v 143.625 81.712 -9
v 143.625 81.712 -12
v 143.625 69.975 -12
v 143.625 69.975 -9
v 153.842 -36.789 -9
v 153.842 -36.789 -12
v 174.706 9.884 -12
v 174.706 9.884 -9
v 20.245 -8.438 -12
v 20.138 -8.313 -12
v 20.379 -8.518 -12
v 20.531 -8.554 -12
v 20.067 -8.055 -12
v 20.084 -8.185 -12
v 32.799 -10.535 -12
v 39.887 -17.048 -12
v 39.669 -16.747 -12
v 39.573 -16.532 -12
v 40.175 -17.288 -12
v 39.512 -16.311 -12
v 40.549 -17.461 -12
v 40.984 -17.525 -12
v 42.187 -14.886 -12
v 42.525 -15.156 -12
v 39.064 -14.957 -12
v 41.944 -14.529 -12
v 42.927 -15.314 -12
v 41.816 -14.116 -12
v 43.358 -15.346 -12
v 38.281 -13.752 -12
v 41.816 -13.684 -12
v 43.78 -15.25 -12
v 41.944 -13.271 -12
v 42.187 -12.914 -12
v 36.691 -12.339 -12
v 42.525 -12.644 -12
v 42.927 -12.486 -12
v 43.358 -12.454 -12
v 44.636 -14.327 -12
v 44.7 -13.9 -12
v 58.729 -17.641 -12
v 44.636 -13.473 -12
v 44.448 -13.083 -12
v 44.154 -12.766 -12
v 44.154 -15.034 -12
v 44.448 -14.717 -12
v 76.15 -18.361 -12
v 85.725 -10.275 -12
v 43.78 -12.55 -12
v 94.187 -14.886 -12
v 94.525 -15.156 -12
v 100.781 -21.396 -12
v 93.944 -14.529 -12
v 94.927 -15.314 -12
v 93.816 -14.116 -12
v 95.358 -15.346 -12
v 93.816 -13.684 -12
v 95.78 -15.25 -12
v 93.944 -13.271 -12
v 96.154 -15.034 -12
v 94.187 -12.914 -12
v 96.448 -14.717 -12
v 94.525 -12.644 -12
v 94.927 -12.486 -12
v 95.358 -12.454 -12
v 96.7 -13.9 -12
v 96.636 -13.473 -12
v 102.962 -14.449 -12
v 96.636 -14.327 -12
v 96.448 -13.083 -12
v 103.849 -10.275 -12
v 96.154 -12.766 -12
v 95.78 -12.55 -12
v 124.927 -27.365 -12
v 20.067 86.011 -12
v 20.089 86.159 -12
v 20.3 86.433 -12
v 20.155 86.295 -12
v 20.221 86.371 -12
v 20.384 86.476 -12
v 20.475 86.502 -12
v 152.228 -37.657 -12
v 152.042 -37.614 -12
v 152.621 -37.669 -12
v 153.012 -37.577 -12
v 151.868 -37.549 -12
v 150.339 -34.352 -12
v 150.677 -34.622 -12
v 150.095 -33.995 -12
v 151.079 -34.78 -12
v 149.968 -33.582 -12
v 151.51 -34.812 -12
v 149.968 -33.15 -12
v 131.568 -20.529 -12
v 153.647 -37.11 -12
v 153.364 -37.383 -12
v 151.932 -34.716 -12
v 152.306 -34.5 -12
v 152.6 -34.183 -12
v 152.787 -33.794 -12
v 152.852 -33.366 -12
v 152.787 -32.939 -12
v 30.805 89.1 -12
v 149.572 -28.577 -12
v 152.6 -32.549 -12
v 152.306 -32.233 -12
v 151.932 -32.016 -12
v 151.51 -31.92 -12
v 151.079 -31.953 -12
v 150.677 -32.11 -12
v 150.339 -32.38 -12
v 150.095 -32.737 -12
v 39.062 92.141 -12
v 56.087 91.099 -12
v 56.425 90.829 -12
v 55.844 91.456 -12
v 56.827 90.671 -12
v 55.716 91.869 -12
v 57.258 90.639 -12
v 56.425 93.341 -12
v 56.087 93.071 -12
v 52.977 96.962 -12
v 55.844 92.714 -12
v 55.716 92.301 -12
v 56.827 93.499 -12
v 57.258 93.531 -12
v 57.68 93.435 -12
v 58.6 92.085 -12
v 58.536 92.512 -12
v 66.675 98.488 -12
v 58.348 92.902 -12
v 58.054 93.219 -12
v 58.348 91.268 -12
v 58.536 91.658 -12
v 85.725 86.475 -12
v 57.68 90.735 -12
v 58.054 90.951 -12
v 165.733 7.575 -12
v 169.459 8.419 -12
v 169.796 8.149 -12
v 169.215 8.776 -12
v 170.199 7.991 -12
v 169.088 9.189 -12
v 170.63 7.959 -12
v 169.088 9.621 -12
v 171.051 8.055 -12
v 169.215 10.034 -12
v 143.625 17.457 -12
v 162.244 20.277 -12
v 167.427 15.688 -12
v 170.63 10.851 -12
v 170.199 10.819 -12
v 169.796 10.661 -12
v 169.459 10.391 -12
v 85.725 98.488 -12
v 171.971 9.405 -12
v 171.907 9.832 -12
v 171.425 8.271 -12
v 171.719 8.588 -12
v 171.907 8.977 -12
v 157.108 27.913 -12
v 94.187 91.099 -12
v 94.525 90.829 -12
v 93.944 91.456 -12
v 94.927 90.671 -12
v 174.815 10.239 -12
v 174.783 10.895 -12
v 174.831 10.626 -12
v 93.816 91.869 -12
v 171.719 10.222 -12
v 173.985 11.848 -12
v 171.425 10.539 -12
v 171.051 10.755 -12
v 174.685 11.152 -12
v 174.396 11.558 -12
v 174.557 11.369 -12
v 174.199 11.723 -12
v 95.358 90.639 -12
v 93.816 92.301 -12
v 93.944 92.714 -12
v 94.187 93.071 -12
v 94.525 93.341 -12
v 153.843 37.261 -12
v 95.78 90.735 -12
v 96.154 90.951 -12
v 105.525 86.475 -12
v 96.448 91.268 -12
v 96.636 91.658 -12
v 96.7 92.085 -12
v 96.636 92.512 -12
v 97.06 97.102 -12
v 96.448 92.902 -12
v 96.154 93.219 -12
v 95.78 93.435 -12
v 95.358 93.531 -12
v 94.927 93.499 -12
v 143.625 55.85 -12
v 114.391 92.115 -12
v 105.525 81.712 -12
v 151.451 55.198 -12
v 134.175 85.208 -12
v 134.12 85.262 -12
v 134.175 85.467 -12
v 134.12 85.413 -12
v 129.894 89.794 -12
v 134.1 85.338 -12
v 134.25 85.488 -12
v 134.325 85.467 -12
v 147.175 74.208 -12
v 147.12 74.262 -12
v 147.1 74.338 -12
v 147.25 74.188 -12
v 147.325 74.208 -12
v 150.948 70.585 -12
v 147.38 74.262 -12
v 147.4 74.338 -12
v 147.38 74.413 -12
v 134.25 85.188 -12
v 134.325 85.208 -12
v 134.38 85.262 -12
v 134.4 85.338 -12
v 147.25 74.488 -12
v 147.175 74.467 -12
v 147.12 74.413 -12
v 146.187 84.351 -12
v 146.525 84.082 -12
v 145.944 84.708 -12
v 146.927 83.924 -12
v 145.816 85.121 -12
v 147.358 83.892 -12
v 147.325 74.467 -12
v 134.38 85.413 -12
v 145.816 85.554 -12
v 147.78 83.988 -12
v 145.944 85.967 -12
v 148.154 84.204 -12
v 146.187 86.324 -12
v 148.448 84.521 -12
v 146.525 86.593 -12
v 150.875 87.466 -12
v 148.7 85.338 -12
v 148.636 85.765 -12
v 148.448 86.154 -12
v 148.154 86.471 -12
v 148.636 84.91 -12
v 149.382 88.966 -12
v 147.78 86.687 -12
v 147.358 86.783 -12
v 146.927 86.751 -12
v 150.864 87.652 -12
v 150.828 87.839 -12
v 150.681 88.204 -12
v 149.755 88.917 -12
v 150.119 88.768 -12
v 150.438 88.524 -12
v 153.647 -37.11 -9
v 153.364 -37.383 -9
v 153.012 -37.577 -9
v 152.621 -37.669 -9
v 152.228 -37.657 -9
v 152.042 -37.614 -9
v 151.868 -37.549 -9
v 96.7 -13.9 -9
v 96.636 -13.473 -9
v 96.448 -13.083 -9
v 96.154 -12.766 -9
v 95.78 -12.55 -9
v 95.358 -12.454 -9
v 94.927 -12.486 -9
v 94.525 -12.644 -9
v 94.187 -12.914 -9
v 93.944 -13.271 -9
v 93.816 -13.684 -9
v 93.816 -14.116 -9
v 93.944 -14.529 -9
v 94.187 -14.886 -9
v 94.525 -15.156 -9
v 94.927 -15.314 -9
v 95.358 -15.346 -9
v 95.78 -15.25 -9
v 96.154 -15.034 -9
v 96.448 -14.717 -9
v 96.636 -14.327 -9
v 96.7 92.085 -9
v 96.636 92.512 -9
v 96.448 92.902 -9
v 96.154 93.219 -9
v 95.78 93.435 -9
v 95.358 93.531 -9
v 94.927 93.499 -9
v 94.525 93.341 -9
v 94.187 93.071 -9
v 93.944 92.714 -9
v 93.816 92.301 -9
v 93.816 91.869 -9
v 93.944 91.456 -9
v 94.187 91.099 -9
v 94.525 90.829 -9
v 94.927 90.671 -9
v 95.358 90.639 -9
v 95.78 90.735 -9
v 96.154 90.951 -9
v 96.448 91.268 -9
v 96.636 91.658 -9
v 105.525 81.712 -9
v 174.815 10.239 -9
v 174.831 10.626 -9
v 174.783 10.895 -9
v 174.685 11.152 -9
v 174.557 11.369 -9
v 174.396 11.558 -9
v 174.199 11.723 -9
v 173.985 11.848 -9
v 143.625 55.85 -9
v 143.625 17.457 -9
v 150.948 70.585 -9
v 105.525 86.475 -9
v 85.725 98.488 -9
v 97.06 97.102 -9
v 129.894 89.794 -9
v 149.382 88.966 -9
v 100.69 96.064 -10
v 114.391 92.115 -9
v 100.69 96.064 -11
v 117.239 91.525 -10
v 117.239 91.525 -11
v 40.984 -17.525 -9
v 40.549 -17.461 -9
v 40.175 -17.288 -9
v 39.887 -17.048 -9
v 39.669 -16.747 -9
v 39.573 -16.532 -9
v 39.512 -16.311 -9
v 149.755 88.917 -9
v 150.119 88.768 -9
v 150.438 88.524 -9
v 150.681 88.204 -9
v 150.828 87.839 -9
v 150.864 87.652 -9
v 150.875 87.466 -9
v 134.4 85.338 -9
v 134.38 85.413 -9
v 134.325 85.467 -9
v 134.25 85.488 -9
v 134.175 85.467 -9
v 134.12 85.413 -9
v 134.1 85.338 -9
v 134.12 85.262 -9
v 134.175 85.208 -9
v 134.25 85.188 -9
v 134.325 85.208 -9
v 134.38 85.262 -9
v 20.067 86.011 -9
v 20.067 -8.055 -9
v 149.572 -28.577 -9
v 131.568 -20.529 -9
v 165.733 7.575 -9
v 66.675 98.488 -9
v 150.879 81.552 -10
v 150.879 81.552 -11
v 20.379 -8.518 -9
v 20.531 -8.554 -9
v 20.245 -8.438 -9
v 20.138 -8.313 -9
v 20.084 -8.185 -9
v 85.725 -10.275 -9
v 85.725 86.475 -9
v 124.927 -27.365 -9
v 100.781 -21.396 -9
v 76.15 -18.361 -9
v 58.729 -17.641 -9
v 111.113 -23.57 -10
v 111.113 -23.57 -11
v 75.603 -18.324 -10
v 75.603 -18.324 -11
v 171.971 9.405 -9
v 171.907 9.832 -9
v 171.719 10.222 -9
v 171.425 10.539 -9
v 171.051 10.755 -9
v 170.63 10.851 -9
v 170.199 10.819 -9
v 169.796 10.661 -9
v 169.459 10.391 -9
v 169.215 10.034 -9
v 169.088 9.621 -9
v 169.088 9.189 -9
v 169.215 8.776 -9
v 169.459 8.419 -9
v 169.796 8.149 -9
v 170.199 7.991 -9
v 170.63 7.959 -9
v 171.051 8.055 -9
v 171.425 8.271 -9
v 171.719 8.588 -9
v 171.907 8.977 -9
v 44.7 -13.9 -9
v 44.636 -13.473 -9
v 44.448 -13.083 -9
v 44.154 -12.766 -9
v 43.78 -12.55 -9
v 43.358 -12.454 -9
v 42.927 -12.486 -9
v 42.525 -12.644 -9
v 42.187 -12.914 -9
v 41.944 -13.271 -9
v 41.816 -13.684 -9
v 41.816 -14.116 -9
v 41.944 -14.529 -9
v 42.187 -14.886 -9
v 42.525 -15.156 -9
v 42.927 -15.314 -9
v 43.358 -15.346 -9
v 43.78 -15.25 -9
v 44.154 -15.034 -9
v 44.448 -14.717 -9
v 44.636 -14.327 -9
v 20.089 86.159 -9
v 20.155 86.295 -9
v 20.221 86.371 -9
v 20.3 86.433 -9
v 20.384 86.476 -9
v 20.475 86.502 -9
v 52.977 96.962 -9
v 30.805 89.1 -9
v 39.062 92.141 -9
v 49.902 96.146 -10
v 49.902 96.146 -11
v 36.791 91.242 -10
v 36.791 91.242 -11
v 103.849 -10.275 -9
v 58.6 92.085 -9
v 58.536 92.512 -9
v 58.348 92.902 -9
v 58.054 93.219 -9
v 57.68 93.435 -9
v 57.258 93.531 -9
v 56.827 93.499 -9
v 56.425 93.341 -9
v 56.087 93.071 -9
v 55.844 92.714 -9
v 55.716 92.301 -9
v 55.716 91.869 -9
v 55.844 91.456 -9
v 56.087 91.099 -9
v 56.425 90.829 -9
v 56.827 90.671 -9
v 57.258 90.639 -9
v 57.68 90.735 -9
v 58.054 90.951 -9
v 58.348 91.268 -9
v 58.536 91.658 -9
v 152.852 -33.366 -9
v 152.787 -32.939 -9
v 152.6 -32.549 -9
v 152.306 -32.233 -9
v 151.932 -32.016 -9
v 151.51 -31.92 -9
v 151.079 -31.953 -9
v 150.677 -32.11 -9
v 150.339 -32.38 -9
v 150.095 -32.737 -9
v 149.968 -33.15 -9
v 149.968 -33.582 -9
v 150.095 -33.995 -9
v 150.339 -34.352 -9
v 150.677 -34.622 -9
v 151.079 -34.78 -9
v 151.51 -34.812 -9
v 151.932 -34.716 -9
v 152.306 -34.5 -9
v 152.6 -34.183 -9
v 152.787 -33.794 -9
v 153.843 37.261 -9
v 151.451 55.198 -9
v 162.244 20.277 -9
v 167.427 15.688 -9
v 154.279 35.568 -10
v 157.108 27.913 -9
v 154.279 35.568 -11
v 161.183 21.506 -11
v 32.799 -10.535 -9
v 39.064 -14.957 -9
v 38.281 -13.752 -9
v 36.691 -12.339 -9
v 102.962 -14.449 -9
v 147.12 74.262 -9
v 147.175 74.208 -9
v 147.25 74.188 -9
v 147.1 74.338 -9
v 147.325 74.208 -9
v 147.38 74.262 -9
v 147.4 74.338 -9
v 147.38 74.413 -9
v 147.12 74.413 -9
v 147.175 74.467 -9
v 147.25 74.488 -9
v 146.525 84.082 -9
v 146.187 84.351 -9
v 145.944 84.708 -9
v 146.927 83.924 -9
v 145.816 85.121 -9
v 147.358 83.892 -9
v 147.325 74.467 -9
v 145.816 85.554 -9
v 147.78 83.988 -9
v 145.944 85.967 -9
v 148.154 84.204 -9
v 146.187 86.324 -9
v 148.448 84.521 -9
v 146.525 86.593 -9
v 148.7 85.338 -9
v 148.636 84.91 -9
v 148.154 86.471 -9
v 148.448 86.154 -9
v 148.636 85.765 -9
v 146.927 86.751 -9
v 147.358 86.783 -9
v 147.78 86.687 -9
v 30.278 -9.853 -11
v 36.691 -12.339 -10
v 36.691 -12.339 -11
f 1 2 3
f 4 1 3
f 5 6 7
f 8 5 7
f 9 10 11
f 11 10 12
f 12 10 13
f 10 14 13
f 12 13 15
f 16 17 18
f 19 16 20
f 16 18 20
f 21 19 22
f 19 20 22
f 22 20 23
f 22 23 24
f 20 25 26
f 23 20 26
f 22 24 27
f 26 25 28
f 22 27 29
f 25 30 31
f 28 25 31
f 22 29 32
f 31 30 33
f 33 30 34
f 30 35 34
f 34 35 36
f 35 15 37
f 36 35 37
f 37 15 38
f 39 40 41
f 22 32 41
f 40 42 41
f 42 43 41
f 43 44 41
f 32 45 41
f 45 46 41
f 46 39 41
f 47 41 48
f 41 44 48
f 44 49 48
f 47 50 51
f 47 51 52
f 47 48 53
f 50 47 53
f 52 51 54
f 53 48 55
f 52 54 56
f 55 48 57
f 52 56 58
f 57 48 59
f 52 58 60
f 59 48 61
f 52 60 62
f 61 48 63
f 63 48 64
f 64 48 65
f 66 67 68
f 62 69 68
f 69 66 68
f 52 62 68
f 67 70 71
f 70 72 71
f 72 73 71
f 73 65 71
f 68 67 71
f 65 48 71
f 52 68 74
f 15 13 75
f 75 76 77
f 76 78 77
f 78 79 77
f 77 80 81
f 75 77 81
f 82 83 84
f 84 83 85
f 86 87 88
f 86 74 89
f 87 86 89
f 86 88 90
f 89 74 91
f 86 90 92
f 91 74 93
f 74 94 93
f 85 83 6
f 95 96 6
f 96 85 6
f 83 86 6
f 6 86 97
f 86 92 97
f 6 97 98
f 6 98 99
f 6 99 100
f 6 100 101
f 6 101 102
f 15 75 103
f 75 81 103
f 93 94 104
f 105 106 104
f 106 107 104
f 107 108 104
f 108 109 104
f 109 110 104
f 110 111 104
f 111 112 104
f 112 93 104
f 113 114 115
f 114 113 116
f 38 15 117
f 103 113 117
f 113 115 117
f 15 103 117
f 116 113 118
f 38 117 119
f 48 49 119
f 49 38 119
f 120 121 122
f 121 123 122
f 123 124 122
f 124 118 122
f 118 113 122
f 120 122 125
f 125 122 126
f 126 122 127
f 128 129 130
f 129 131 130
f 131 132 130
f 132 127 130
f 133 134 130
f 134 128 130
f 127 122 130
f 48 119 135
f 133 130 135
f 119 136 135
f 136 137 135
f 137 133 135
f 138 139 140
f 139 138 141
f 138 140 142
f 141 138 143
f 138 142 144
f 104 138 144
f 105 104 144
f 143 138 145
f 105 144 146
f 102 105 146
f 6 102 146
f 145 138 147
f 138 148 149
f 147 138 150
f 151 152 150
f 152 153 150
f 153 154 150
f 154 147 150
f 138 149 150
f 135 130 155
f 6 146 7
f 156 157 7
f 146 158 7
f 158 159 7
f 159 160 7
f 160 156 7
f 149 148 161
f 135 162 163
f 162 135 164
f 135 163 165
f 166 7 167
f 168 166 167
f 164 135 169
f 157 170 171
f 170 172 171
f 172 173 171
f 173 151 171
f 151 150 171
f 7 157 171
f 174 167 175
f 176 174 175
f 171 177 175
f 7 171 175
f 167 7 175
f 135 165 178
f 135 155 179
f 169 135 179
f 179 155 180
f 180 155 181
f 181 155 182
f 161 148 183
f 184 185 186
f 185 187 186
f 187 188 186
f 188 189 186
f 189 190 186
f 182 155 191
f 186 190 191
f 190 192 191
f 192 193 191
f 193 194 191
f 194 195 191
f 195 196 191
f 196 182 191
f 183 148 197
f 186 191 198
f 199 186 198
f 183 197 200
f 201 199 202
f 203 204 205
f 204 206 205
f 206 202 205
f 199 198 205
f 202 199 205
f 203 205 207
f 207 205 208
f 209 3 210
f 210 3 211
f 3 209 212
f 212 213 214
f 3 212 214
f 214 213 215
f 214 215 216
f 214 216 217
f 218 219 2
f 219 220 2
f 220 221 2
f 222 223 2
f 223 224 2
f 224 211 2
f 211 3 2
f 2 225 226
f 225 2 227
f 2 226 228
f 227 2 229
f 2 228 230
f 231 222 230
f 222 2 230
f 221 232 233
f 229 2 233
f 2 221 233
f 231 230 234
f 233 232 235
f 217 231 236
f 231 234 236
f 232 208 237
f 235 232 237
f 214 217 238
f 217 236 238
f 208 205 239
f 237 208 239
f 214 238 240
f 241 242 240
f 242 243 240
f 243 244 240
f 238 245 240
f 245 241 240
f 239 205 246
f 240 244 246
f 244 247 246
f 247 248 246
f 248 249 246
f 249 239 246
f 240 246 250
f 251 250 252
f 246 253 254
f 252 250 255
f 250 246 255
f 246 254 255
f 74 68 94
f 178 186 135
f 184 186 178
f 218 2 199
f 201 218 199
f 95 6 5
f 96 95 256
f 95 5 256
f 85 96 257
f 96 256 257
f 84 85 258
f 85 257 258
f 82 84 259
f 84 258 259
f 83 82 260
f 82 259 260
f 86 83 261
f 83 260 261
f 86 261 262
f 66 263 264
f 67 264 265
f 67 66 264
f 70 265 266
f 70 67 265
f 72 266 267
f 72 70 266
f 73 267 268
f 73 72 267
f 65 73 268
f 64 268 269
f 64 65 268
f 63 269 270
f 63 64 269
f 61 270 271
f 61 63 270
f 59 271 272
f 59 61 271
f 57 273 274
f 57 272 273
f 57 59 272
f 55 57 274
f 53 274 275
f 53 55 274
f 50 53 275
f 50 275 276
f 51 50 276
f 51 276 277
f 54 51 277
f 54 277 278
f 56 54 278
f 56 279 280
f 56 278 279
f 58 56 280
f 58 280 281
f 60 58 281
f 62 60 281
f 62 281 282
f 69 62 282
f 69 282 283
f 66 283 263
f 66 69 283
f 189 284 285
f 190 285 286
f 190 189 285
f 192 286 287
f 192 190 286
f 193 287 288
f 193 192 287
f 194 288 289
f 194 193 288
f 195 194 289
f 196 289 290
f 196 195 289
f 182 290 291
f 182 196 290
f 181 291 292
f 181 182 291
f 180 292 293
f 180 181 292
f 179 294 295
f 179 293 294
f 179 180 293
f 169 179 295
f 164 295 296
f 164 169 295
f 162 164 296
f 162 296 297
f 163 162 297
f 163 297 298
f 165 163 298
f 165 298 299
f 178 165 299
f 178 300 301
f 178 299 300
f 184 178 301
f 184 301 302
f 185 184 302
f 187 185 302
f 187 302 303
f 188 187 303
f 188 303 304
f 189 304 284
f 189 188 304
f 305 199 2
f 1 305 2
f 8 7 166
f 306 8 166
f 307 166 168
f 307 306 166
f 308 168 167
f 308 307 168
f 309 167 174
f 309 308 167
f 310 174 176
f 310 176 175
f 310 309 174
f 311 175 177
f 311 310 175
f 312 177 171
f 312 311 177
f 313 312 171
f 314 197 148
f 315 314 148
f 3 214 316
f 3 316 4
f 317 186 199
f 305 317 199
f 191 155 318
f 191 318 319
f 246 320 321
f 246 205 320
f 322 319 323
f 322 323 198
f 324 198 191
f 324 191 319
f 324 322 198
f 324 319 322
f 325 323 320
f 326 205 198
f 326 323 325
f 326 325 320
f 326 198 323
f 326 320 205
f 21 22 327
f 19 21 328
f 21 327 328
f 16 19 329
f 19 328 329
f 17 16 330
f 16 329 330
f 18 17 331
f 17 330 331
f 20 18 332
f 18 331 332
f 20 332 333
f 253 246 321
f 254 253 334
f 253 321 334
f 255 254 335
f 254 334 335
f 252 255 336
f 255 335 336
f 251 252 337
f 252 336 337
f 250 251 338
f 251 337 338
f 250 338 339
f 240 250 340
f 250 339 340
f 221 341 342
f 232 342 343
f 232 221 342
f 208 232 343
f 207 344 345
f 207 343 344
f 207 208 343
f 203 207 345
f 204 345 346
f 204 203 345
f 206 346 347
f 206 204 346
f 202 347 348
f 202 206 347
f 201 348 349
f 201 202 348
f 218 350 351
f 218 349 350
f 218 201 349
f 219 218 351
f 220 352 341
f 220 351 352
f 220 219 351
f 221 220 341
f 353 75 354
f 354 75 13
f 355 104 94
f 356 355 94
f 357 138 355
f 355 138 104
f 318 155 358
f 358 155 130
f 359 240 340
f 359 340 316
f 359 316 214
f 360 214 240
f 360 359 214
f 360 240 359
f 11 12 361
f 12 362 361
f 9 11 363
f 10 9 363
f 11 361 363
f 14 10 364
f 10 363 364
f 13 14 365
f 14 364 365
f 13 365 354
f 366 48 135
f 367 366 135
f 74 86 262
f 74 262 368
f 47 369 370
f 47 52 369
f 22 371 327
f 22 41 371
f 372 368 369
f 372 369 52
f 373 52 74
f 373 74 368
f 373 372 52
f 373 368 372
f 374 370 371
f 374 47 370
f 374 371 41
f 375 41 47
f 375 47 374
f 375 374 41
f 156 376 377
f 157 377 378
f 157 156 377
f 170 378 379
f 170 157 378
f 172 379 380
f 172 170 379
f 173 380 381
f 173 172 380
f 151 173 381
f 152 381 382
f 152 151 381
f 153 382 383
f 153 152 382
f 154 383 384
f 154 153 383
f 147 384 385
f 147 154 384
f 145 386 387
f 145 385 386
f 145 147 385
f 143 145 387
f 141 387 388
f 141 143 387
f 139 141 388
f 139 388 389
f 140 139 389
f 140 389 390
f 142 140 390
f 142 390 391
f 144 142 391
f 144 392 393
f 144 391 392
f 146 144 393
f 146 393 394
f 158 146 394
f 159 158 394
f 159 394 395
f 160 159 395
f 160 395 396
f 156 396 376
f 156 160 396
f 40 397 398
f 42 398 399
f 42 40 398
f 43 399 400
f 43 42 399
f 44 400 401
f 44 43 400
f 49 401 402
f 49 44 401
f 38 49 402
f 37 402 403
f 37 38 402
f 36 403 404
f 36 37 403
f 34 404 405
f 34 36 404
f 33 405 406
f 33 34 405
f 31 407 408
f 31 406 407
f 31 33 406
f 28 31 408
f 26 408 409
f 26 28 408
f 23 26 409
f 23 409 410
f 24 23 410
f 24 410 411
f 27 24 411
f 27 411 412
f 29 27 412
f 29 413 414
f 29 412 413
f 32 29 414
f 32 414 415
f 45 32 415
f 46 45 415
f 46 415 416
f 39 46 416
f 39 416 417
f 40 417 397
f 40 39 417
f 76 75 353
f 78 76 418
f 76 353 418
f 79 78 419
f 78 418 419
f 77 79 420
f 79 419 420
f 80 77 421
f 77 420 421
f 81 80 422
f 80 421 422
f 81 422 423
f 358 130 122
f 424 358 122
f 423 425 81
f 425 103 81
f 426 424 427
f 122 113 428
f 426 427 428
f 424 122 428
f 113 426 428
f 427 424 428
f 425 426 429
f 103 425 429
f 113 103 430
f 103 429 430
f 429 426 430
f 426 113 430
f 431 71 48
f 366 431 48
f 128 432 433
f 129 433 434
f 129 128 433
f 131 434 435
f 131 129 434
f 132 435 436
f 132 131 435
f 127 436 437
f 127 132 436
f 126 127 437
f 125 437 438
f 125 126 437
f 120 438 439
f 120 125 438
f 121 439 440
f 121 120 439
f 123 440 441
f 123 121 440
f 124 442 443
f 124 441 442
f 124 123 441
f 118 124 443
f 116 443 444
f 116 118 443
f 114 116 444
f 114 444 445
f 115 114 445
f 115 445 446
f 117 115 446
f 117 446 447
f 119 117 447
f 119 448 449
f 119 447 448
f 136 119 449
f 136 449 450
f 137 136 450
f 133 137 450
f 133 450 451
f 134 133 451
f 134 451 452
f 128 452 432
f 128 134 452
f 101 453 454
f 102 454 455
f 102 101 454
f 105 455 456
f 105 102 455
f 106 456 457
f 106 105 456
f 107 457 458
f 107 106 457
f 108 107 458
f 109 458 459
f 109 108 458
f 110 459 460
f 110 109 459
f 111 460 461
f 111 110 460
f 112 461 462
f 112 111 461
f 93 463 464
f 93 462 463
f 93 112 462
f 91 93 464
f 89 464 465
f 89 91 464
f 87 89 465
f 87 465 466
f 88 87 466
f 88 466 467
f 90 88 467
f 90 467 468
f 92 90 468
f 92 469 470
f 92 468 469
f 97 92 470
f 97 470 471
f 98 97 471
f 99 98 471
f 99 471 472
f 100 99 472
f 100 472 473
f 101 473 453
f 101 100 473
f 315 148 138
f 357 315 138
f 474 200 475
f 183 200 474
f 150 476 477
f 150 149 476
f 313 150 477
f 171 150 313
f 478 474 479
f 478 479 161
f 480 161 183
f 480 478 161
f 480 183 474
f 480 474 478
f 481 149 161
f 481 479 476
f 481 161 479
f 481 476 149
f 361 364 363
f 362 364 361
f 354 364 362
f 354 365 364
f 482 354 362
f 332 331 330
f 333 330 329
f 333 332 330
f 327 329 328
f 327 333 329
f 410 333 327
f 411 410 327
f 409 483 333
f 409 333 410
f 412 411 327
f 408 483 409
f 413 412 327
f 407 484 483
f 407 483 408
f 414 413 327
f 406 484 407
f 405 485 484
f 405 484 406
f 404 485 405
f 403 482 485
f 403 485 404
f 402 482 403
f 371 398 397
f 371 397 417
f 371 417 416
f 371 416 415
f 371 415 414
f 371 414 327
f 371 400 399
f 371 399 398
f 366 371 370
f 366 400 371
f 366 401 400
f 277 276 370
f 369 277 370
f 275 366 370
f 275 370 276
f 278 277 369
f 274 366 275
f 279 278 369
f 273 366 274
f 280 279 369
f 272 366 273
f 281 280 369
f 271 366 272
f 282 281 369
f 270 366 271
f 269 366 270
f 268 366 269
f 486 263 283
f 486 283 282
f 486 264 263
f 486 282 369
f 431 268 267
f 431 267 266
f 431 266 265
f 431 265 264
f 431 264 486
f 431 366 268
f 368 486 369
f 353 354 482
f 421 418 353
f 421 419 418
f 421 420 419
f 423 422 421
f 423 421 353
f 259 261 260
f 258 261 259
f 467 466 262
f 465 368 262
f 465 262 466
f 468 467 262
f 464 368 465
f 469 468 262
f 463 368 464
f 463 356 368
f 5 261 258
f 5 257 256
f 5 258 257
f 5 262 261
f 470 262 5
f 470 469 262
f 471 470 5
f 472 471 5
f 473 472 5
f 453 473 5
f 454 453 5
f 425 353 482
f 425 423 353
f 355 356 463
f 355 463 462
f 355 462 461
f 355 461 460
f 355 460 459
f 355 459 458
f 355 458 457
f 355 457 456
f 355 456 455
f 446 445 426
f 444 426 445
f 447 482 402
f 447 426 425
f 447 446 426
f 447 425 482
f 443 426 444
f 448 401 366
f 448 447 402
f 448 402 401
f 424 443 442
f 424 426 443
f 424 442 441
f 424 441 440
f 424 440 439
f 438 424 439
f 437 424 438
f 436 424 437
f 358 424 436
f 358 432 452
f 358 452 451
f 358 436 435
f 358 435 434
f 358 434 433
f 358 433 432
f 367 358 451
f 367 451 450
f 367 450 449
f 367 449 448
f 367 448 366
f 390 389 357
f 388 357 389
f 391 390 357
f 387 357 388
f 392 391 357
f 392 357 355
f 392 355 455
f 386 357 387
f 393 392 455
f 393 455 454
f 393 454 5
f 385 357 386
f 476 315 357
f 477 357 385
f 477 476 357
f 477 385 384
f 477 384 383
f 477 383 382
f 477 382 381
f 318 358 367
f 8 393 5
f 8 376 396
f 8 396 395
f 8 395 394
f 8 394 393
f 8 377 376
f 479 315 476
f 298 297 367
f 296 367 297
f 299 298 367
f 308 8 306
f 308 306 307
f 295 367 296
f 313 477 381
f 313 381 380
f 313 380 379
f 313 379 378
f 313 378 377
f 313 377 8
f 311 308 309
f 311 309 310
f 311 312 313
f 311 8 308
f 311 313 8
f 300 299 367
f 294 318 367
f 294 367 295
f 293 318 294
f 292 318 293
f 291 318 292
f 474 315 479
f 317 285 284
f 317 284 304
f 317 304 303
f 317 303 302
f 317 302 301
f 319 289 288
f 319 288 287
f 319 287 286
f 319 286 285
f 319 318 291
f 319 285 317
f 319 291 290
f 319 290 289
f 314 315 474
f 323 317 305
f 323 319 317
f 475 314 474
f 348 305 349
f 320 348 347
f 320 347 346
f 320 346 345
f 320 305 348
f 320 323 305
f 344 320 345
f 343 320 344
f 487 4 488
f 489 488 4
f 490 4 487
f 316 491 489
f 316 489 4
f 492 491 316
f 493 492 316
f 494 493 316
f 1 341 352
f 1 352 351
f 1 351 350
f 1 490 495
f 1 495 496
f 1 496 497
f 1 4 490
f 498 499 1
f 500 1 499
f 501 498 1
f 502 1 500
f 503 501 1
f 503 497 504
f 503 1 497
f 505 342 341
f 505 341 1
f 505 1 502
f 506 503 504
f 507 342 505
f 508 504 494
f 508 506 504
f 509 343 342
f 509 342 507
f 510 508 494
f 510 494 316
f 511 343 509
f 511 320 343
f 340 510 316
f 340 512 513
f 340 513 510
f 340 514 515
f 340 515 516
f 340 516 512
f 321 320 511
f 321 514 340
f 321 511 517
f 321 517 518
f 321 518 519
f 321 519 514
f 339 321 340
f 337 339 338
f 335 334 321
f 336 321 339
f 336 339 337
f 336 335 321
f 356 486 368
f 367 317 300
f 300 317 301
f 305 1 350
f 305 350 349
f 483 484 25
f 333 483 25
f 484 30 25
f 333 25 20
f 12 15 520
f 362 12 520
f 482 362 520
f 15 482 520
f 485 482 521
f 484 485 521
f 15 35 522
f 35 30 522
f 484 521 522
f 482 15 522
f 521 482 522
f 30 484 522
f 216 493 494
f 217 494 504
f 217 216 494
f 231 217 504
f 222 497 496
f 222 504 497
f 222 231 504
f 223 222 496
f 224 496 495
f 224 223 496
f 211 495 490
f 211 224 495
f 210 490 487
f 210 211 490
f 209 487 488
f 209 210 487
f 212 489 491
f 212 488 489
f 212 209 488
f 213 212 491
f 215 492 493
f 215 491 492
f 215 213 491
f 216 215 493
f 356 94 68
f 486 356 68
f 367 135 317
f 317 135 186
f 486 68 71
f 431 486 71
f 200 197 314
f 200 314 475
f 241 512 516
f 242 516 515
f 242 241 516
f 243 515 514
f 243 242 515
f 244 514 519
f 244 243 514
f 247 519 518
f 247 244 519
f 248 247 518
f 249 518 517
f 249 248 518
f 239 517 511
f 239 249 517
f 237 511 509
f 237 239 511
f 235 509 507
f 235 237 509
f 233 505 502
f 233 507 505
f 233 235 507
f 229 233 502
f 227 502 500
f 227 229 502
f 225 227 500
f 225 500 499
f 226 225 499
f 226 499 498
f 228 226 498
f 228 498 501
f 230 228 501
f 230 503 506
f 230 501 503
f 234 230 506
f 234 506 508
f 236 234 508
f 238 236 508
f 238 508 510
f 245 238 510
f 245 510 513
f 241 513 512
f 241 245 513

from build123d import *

# Parameters (mm, degrees)
PAD008_DEPTH    = 3
POCKET011_DEPTH = 5
SKETCH043_R     = 1.45
POCKET017_DEPTH = 22
POCKET023_DEPTH = 28
SKETCH059_R     = 0.15
POCKET030_DEPTH = 32
FILLET006_R     = 1.5
FILLET014_R     = 0.5


with BuildPart() as part:
    # Sketch030 → Pad008 (new body)
    with BuildSketch(Plane.XY):
        with BuildLine():
            Line((153.231854, -38.154949), (175.310198, 11.234895))
            add(Edge.make_bspline(
                [(150.875, 88.9625), (150.875, 42.8625), (150.875, 22.157965), (175.310198, 11.234895)],
                knots=[0, 0, 0, 0, 1, 1, 1, 1], degree=3))
            add(Edge.make_bspline(
                [(85.725, 98.4875), (104.775, 98.4875), (104.775, 88.9625), (150.875, 88.9625)],
                knots=[0, 0, 0, 0, 1, 1, 1, 1], degree=3))
            Line((85.725, 98.4875), (66.675, 98.4875))
            add(Edge.make_bspline(
                [(66.675, 98.4875), (45.641399, 98.334473), (40.615566, 90.142487), (20.066667, 86.427261)],
                knots=[0, 0, 0, 0, 1, 1, 1, 1], degree=3))
            Line((20.066667, 86.427261), (20.066667, -8.521476))
            add(Edge.make_bspline(
                [(20.066667, -8.521476), (32.593586, -9.362079), (39.625488, -11.778089), (39.625, -17.525)],
                knots=[0, 0, 0, 0, 1, 1, 1, 1], degree=3))
            add(Edge.make_bspline(
                [(153.231854, -38.154949), (107.082107, -17.525), (76.2, -17.525), (39.625, -17.525)],
                knots=[0, 0, 0, 0, 1, 1, 1, 1], degree=3))
        make_face()
    extrude(amount=PAD008_DEPTH)

    # Sketch031 → Pocket011 (cut)
    with BuildSketch(Plane(origin=(0, 0, 0), x_dir=(1, 0, 0), z_dir=(0, 0, -1))):
        Polygon((85.725, -86.475), (105.525, -86.475), (105.525, -81.7125), (143.625, -81.7125), (143.625, -17.457464), (165.732668, -7.574851), (149.57181, 28.577419), (131.568158, 20.529392), (102.96164, 14.448889), (103.848827, 10.275), (85.725, 10.275), align=None)
    extrude(amount=-POCKET011_DEPTH, mode=Mode.SUBTRACT)

    # Sketch043 → Pocket017 (cut)
    with BuildSketch(Plane.XY):
        with Locations((-4.375, -4.375)):
            Circle(SKETCH043_R)
        with Locations((-4.375, 80.575)):
            Circle(SKETCH043_R)
        with Locations((151.401832, -33.366184)):
            Circle(SKETCH043_R)
        with Locations((170.521433, 9.404873)):
            Circle(SKETCH043_R)
        with Locations((147.25, 85.3375)):
            Circle(SKETCH043_R)
        with Locations((43.25, -13.9)):
            Circle(SKETCH043_R)
        with Locations((57.15, 92.085)):
            Circle(SKETCH043_R)
        with Locations((95.25, 92.085)):
            Circle(SKETCH043_R)
        with Locations((95.25, -13.9)):
            Circle(SKETCH043_R)
    extrude(amount=POCKET017_DEPTH, mode=Mode.SUBTRACT)

    # Sketch051 → Pocket023 (cut)
    with BuildSketch(Plane.XY):
        Polygon((142.875, 69.9125), (142.875, 55.9125), (154.875, 54.9125), (154.875, 70.9125), align=None)
    extrude(amount=POCKET023_DEPTH, mode=Mode.SUBTRACT)

    # Sketch059 → Pocket030 (cut)
    with BuildSketch(Plane.XY):
        with Locations((134.25, 85.3375)):
            Circle(SKETCH059_R)
        with Locations((147.25, 74.3375)):
            Circle(SKETCH059_R)
    extrude(amount=POCKET030_DEPTH, mode=Mode.SUBTRACT)

    # Fillet006
    fillet006_edges = [part.edges().sort_by_distance(p)[0] for p in [
        (39.625, -17.525, 1.5),
        (153.231854, -38.154949, 1.5),
        (175.310198, 11.234895, 1.5),
        (150.875, 88.9625, 1.5),
    ]]
    fillet(fillet006_edges, radius=FILLET006_R)

    # Fillet014
    fillet014_edges = [part.edges().sort_by_distance(p)[0] for p in [
        (20.066667, -8.521476, 1.5),
        (20.066667, 86.427261, 1.5),
    ]]
    fillet(fillet014_edges, radius=FILLET014_R)


with BuildPart() as part_1:
    # Body007 placement: moved
    add(part.part.moved(Location((0, 0, -12))))


solid = part_1.part
